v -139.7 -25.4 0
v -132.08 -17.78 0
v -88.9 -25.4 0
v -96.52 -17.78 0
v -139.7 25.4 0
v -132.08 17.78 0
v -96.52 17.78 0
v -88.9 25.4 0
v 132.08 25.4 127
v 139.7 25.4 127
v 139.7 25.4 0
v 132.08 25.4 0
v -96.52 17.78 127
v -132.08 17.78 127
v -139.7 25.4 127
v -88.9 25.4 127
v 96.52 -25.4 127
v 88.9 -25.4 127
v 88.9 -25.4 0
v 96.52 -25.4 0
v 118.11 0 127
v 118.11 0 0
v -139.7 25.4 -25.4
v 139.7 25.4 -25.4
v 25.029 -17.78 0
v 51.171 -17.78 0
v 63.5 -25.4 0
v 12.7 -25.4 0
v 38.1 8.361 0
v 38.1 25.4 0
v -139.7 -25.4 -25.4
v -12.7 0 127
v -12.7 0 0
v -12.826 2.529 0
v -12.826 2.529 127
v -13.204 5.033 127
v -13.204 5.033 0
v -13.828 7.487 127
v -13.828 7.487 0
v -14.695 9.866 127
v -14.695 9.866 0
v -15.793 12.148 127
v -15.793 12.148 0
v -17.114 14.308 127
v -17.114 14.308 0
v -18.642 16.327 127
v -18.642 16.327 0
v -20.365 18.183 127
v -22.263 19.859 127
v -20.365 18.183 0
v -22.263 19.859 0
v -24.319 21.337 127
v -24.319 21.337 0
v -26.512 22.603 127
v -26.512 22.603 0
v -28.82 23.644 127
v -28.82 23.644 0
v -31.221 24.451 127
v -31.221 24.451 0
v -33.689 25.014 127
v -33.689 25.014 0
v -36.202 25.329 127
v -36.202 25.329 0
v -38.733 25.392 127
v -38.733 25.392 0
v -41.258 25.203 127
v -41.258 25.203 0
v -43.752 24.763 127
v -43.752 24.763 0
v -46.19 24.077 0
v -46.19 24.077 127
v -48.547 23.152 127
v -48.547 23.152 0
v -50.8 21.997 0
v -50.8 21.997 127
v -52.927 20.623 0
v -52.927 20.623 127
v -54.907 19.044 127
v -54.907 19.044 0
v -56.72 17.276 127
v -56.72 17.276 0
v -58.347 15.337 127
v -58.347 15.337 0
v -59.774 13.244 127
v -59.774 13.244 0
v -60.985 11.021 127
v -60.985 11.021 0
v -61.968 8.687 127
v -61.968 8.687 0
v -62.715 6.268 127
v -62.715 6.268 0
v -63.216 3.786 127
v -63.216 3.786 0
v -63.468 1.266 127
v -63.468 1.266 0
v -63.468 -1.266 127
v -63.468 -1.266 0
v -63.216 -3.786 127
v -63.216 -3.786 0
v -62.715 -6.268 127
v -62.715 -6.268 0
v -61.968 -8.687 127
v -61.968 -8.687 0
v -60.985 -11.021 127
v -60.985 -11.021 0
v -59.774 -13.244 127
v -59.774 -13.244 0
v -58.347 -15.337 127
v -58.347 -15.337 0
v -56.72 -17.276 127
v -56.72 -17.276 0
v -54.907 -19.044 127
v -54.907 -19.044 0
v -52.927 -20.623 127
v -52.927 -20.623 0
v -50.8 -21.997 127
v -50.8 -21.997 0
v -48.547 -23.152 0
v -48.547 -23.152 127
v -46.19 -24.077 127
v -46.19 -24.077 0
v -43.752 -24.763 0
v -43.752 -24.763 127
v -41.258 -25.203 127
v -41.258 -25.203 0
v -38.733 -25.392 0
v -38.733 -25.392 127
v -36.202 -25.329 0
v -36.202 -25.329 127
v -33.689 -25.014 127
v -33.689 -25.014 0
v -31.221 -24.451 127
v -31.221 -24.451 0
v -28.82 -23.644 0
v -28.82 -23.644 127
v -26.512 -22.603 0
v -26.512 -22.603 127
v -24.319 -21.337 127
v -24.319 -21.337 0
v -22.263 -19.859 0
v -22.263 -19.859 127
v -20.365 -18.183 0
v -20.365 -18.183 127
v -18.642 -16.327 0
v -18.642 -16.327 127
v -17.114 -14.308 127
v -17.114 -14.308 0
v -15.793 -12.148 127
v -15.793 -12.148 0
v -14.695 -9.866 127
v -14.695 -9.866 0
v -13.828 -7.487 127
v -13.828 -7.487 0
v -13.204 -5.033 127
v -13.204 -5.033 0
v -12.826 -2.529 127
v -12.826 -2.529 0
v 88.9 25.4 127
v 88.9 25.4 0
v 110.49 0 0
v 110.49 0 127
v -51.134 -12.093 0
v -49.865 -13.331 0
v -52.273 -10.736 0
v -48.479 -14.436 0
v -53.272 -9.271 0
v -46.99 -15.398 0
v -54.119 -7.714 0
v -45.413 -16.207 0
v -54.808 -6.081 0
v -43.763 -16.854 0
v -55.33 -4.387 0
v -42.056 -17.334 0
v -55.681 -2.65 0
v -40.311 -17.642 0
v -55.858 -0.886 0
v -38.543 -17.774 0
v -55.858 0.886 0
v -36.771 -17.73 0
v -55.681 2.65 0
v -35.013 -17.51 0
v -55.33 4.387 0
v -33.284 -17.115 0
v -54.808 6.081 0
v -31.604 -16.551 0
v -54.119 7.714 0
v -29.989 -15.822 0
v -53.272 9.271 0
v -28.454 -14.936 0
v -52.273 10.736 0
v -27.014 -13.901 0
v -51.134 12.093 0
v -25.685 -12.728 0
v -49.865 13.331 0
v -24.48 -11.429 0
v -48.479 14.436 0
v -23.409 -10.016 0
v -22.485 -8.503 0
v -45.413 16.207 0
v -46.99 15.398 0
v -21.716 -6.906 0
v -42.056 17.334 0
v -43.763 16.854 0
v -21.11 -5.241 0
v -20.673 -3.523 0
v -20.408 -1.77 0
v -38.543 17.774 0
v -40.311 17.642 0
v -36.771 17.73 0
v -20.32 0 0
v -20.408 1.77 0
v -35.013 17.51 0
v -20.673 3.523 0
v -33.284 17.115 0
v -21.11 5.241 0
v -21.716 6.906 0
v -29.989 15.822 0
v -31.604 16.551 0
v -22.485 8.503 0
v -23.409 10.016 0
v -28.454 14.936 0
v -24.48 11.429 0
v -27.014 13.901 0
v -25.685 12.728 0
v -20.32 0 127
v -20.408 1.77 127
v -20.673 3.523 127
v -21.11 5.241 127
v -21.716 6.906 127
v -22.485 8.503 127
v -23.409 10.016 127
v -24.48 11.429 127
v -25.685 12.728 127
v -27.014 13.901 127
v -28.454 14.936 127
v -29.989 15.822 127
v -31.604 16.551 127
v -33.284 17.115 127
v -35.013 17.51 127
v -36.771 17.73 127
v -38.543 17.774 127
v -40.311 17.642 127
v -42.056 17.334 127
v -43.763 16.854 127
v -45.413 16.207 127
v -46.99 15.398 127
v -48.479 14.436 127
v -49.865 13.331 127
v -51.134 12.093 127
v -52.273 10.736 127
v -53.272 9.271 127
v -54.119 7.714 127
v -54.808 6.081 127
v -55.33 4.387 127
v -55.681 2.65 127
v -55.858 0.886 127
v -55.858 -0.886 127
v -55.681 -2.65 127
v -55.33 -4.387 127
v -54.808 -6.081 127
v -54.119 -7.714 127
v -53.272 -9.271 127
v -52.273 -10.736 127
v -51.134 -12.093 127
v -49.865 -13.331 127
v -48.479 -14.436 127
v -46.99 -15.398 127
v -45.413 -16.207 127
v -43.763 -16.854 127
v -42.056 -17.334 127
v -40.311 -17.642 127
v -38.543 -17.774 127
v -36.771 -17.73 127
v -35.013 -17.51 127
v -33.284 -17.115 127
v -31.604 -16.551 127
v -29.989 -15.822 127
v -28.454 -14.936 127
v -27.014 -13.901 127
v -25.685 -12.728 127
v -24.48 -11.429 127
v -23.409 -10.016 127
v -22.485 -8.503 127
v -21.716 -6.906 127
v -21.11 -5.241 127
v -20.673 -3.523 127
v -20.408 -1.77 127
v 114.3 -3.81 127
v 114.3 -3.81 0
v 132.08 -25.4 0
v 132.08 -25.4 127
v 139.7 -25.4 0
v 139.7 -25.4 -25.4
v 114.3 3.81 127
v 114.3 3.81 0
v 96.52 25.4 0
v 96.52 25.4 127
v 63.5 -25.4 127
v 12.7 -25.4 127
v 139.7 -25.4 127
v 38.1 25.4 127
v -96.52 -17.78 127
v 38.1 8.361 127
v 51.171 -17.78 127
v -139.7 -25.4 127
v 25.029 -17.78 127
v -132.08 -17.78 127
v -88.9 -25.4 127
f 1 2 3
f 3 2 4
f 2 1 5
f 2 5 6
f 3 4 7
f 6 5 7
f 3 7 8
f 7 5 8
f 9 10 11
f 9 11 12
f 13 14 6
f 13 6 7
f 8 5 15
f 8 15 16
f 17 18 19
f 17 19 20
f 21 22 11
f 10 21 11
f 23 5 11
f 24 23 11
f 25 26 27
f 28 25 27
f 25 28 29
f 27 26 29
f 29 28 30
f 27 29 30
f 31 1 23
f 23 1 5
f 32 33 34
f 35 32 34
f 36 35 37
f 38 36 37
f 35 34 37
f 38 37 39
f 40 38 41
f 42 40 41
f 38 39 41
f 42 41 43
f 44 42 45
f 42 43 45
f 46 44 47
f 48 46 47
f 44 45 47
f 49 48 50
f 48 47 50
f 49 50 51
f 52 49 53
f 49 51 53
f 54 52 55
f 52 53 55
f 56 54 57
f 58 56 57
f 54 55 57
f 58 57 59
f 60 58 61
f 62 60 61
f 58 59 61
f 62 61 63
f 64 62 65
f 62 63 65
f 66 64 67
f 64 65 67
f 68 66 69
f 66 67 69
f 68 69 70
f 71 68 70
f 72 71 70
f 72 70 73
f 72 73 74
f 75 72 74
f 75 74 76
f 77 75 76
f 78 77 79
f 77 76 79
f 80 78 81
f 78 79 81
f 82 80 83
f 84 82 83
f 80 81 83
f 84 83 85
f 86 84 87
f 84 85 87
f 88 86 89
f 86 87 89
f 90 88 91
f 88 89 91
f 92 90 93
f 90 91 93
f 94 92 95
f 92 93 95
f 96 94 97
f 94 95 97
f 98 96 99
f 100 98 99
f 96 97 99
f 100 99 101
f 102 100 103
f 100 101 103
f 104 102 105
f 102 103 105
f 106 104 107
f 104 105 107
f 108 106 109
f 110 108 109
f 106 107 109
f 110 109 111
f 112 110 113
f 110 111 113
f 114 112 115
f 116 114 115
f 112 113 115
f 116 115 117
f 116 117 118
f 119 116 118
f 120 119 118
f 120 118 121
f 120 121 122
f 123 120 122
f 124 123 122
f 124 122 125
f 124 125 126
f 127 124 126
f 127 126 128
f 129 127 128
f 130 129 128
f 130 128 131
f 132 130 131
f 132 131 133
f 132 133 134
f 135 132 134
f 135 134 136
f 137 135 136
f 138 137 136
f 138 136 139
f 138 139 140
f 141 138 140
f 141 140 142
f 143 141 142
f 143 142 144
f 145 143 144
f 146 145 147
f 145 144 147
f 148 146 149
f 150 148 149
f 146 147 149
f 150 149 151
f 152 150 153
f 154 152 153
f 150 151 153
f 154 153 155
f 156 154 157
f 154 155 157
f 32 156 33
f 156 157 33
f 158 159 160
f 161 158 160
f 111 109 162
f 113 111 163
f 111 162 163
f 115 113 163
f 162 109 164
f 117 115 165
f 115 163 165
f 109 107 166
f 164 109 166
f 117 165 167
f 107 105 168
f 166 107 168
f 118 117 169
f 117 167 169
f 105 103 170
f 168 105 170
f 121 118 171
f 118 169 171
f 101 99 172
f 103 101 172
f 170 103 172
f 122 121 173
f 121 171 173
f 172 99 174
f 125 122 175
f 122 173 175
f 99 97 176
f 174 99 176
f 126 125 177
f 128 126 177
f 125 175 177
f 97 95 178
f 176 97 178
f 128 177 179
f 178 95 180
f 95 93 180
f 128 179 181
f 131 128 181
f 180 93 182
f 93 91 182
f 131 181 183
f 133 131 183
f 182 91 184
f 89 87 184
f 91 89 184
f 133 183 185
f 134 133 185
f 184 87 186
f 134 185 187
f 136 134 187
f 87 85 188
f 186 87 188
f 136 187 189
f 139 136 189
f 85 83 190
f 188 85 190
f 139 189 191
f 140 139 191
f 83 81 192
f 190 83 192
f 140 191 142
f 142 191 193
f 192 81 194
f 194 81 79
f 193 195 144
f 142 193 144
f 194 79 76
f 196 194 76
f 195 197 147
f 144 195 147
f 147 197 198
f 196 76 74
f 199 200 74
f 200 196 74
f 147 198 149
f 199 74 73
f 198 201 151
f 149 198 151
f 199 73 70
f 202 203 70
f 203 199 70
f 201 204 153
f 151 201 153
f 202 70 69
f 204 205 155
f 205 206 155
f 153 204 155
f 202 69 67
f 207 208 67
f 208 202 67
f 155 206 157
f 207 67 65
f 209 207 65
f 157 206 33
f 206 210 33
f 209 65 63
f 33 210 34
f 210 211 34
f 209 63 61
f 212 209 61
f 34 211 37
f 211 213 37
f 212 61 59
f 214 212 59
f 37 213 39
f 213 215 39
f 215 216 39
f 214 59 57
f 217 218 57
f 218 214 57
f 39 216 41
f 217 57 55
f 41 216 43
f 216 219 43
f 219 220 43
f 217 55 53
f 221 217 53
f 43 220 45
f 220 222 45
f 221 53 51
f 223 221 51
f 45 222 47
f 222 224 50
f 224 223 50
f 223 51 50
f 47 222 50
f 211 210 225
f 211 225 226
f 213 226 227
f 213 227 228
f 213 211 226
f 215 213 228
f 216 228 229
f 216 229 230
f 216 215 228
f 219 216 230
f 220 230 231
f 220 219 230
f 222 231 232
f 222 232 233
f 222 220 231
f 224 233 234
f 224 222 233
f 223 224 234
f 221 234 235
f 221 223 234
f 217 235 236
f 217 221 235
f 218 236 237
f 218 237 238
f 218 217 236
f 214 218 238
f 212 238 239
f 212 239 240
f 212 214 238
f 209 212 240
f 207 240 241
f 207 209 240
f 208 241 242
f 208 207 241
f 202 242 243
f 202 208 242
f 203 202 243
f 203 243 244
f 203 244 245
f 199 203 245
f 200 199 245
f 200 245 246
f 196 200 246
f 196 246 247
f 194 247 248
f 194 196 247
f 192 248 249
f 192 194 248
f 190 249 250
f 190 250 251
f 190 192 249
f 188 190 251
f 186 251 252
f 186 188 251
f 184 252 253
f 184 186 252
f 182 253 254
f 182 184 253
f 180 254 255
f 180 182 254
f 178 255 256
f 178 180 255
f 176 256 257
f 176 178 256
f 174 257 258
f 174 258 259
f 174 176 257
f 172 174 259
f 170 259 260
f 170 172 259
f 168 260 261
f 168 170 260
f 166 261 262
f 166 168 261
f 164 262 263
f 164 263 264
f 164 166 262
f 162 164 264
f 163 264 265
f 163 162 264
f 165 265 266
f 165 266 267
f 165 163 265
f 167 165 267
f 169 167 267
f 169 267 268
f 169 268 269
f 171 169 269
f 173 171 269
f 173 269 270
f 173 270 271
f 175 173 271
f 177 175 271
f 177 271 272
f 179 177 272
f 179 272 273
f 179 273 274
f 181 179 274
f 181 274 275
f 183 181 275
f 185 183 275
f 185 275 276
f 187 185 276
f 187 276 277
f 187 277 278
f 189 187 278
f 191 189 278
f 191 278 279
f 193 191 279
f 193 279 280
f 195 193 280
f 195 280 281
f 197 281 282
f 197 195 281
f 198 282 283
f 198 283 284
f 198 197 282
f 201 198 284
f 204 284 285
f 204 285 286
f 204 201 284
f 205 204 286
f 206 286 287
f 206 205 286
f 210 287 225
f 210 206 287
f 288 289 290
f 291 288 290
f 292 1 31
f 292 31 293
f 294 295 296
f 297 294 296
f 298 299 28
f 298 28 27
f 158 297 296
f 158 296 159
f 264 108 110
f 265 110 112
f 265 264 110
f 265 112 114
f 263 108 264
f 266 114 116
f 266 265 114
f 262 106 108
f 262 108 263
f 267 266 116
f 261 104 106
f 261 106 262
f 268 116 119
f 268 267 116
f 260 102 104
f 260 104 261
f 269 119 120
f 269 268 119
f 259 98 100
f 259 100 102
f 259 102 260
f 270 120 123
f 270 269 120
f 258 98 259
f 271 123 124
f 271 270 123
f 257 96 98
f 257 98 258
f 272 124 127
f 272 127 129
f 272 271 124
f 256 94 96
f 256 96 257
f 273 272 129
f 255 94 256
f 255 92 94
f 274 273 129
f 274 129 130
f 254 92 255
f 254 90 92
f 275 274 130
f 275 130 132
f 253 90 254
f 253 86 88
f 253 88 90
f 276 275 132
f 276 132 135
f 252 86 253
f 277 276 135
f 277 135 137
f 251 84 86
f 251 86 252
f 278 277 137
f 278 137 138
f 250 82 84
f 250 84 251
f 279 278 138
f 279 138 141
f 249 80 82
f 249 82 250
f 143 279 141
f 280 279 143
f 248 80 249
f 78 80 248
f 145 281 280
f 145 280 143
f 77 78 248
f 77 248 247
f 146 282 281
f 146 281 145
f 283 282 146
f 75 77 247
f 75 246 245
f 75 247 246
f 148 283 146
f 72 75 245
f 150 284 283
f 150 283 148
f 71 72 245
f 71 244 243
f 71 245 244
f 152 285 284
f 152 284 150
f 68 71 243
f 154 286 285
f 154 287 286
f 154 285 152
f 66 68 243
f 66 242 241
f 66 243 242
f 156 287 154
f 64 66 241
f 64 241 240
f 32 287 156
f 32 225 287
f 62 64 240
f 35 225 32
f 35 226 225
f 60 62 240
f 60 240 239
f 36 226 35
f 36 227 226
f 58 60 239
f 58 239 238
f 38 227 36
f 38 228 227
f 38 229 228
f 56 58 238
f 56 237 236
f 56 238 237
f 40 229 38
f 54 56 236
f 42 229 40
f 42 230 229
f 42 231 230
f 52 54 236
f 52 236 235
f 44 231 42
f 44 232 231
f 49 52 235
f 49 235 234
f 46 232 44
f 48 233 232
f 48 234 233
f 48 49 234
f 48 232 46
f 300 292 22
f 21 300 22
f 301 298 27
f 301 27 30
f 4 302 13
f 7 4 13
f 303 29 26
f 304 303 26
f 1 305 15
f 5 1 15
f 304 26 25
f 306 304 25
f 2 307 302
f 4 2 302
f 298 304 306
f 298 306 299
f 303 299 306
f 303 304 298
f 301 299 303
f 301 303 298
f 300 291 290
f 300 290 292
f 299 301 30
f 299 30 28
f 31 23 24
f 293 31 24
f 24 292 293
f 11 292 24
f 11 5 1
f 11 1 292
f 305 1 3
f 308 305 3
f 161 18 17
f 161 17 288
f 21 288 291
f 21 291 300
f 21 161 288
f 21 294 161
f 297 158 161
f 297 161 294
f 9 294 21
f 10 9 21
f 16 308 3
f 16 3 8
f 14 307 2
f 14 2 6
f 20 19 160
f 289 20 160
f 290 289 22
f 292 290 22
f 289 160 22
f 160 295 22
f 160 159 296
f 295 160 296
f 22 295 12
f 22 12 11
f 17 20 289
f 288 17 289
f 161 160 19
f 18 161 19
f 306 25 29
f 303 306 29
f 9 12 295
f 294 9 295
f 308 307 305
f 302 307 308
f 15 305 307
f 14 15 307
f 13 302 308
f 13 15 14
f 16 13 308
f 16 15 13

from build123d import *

# Parameters (mm, degrees)
F0_W      = 279.4
F0_H      = 50.8
F1_DEPTH  = 25.4
F2_W      = 50.8
F2_H      = 50.8
F3_DEPTH  = 127
F4_W      = 35.56
F4_H      = 35.56
F5_DEPTH  = 127
F6_R      = 25.4
F6_R_2    = 17.78
F7_DEPTH  = 127
F9_DEPTH  = 127
F11_DEPTH = 127


with BuildPart() as f1:
    # F0 (on Top) → F1 (new body)
    with BuildSketch(Plane.XY):
        Rectangle(F0_W, F0_H)
    extrude(amount=-F1_DEPTH)


with BuildPart() as f3:
    # F2 (on face) → F3 (new body)
    with BuildSketch(Plane.XY):
        with Locations((-114.3, 0)):
            Rectangle(F2_W, F2_H)
    extrude(amount=F3_DEPTH)

    # F4 (on face) → F5 (cut)
    with BuildSketch(Plane.XY.offset(127)):
        with Locations((-114.3, 0)):
            Rectangle(F4_W, F4_H)
    extrude(amount=-F5_DEPTH, mode=Mode.SUBTRACT)


with BuildPart() as f7:
    # F6 (on face) → F7 (new body)
    with BuildSketch(Plane.XY):
        with Locations((-38.1, 0)):
            Circle(F6_R)
        with Locations((-38.1, 0)):
            Circle(F6_R_2, mode=Mode.SUBTRACT)
    extrude(amount=F7_DEPTH)


with BuildPart() as f9:
    # F8 (on face) → F9 (new body)
    with BuildSketch(Plane.XY):
        Polygon((38.1, 25.4), (12.7, -25.4), (63.5, -25.4), align=None)
        Polygon((25.029419, -17.78), (38.1, 8.361162), (51.170581, -17.78), align=None, mode=Mode.SUBTRACT)
    extrude(amount=F9_DEPTH)


with BuildPart() as f11:
    # F10 (on face) → F11 (new body)
    with BuildSketch(Plane.XY):
        Polygon((110.49, 0), (88.9, -25.4), (96.52, -25.4), (114.3, -3.81), (132.08, -25.4), (139.7, -25.4), (118.11, 0), (139.7, 25.4), (132.08, 25.4), (114.3, 3.81), (96.52, 25.4), (88.9, 25.4), align=None)
    extrude(amount=F11_DEPTH)


solid = Compound([f1.part, f3.part, f7.part, f9.part, f11.part])
